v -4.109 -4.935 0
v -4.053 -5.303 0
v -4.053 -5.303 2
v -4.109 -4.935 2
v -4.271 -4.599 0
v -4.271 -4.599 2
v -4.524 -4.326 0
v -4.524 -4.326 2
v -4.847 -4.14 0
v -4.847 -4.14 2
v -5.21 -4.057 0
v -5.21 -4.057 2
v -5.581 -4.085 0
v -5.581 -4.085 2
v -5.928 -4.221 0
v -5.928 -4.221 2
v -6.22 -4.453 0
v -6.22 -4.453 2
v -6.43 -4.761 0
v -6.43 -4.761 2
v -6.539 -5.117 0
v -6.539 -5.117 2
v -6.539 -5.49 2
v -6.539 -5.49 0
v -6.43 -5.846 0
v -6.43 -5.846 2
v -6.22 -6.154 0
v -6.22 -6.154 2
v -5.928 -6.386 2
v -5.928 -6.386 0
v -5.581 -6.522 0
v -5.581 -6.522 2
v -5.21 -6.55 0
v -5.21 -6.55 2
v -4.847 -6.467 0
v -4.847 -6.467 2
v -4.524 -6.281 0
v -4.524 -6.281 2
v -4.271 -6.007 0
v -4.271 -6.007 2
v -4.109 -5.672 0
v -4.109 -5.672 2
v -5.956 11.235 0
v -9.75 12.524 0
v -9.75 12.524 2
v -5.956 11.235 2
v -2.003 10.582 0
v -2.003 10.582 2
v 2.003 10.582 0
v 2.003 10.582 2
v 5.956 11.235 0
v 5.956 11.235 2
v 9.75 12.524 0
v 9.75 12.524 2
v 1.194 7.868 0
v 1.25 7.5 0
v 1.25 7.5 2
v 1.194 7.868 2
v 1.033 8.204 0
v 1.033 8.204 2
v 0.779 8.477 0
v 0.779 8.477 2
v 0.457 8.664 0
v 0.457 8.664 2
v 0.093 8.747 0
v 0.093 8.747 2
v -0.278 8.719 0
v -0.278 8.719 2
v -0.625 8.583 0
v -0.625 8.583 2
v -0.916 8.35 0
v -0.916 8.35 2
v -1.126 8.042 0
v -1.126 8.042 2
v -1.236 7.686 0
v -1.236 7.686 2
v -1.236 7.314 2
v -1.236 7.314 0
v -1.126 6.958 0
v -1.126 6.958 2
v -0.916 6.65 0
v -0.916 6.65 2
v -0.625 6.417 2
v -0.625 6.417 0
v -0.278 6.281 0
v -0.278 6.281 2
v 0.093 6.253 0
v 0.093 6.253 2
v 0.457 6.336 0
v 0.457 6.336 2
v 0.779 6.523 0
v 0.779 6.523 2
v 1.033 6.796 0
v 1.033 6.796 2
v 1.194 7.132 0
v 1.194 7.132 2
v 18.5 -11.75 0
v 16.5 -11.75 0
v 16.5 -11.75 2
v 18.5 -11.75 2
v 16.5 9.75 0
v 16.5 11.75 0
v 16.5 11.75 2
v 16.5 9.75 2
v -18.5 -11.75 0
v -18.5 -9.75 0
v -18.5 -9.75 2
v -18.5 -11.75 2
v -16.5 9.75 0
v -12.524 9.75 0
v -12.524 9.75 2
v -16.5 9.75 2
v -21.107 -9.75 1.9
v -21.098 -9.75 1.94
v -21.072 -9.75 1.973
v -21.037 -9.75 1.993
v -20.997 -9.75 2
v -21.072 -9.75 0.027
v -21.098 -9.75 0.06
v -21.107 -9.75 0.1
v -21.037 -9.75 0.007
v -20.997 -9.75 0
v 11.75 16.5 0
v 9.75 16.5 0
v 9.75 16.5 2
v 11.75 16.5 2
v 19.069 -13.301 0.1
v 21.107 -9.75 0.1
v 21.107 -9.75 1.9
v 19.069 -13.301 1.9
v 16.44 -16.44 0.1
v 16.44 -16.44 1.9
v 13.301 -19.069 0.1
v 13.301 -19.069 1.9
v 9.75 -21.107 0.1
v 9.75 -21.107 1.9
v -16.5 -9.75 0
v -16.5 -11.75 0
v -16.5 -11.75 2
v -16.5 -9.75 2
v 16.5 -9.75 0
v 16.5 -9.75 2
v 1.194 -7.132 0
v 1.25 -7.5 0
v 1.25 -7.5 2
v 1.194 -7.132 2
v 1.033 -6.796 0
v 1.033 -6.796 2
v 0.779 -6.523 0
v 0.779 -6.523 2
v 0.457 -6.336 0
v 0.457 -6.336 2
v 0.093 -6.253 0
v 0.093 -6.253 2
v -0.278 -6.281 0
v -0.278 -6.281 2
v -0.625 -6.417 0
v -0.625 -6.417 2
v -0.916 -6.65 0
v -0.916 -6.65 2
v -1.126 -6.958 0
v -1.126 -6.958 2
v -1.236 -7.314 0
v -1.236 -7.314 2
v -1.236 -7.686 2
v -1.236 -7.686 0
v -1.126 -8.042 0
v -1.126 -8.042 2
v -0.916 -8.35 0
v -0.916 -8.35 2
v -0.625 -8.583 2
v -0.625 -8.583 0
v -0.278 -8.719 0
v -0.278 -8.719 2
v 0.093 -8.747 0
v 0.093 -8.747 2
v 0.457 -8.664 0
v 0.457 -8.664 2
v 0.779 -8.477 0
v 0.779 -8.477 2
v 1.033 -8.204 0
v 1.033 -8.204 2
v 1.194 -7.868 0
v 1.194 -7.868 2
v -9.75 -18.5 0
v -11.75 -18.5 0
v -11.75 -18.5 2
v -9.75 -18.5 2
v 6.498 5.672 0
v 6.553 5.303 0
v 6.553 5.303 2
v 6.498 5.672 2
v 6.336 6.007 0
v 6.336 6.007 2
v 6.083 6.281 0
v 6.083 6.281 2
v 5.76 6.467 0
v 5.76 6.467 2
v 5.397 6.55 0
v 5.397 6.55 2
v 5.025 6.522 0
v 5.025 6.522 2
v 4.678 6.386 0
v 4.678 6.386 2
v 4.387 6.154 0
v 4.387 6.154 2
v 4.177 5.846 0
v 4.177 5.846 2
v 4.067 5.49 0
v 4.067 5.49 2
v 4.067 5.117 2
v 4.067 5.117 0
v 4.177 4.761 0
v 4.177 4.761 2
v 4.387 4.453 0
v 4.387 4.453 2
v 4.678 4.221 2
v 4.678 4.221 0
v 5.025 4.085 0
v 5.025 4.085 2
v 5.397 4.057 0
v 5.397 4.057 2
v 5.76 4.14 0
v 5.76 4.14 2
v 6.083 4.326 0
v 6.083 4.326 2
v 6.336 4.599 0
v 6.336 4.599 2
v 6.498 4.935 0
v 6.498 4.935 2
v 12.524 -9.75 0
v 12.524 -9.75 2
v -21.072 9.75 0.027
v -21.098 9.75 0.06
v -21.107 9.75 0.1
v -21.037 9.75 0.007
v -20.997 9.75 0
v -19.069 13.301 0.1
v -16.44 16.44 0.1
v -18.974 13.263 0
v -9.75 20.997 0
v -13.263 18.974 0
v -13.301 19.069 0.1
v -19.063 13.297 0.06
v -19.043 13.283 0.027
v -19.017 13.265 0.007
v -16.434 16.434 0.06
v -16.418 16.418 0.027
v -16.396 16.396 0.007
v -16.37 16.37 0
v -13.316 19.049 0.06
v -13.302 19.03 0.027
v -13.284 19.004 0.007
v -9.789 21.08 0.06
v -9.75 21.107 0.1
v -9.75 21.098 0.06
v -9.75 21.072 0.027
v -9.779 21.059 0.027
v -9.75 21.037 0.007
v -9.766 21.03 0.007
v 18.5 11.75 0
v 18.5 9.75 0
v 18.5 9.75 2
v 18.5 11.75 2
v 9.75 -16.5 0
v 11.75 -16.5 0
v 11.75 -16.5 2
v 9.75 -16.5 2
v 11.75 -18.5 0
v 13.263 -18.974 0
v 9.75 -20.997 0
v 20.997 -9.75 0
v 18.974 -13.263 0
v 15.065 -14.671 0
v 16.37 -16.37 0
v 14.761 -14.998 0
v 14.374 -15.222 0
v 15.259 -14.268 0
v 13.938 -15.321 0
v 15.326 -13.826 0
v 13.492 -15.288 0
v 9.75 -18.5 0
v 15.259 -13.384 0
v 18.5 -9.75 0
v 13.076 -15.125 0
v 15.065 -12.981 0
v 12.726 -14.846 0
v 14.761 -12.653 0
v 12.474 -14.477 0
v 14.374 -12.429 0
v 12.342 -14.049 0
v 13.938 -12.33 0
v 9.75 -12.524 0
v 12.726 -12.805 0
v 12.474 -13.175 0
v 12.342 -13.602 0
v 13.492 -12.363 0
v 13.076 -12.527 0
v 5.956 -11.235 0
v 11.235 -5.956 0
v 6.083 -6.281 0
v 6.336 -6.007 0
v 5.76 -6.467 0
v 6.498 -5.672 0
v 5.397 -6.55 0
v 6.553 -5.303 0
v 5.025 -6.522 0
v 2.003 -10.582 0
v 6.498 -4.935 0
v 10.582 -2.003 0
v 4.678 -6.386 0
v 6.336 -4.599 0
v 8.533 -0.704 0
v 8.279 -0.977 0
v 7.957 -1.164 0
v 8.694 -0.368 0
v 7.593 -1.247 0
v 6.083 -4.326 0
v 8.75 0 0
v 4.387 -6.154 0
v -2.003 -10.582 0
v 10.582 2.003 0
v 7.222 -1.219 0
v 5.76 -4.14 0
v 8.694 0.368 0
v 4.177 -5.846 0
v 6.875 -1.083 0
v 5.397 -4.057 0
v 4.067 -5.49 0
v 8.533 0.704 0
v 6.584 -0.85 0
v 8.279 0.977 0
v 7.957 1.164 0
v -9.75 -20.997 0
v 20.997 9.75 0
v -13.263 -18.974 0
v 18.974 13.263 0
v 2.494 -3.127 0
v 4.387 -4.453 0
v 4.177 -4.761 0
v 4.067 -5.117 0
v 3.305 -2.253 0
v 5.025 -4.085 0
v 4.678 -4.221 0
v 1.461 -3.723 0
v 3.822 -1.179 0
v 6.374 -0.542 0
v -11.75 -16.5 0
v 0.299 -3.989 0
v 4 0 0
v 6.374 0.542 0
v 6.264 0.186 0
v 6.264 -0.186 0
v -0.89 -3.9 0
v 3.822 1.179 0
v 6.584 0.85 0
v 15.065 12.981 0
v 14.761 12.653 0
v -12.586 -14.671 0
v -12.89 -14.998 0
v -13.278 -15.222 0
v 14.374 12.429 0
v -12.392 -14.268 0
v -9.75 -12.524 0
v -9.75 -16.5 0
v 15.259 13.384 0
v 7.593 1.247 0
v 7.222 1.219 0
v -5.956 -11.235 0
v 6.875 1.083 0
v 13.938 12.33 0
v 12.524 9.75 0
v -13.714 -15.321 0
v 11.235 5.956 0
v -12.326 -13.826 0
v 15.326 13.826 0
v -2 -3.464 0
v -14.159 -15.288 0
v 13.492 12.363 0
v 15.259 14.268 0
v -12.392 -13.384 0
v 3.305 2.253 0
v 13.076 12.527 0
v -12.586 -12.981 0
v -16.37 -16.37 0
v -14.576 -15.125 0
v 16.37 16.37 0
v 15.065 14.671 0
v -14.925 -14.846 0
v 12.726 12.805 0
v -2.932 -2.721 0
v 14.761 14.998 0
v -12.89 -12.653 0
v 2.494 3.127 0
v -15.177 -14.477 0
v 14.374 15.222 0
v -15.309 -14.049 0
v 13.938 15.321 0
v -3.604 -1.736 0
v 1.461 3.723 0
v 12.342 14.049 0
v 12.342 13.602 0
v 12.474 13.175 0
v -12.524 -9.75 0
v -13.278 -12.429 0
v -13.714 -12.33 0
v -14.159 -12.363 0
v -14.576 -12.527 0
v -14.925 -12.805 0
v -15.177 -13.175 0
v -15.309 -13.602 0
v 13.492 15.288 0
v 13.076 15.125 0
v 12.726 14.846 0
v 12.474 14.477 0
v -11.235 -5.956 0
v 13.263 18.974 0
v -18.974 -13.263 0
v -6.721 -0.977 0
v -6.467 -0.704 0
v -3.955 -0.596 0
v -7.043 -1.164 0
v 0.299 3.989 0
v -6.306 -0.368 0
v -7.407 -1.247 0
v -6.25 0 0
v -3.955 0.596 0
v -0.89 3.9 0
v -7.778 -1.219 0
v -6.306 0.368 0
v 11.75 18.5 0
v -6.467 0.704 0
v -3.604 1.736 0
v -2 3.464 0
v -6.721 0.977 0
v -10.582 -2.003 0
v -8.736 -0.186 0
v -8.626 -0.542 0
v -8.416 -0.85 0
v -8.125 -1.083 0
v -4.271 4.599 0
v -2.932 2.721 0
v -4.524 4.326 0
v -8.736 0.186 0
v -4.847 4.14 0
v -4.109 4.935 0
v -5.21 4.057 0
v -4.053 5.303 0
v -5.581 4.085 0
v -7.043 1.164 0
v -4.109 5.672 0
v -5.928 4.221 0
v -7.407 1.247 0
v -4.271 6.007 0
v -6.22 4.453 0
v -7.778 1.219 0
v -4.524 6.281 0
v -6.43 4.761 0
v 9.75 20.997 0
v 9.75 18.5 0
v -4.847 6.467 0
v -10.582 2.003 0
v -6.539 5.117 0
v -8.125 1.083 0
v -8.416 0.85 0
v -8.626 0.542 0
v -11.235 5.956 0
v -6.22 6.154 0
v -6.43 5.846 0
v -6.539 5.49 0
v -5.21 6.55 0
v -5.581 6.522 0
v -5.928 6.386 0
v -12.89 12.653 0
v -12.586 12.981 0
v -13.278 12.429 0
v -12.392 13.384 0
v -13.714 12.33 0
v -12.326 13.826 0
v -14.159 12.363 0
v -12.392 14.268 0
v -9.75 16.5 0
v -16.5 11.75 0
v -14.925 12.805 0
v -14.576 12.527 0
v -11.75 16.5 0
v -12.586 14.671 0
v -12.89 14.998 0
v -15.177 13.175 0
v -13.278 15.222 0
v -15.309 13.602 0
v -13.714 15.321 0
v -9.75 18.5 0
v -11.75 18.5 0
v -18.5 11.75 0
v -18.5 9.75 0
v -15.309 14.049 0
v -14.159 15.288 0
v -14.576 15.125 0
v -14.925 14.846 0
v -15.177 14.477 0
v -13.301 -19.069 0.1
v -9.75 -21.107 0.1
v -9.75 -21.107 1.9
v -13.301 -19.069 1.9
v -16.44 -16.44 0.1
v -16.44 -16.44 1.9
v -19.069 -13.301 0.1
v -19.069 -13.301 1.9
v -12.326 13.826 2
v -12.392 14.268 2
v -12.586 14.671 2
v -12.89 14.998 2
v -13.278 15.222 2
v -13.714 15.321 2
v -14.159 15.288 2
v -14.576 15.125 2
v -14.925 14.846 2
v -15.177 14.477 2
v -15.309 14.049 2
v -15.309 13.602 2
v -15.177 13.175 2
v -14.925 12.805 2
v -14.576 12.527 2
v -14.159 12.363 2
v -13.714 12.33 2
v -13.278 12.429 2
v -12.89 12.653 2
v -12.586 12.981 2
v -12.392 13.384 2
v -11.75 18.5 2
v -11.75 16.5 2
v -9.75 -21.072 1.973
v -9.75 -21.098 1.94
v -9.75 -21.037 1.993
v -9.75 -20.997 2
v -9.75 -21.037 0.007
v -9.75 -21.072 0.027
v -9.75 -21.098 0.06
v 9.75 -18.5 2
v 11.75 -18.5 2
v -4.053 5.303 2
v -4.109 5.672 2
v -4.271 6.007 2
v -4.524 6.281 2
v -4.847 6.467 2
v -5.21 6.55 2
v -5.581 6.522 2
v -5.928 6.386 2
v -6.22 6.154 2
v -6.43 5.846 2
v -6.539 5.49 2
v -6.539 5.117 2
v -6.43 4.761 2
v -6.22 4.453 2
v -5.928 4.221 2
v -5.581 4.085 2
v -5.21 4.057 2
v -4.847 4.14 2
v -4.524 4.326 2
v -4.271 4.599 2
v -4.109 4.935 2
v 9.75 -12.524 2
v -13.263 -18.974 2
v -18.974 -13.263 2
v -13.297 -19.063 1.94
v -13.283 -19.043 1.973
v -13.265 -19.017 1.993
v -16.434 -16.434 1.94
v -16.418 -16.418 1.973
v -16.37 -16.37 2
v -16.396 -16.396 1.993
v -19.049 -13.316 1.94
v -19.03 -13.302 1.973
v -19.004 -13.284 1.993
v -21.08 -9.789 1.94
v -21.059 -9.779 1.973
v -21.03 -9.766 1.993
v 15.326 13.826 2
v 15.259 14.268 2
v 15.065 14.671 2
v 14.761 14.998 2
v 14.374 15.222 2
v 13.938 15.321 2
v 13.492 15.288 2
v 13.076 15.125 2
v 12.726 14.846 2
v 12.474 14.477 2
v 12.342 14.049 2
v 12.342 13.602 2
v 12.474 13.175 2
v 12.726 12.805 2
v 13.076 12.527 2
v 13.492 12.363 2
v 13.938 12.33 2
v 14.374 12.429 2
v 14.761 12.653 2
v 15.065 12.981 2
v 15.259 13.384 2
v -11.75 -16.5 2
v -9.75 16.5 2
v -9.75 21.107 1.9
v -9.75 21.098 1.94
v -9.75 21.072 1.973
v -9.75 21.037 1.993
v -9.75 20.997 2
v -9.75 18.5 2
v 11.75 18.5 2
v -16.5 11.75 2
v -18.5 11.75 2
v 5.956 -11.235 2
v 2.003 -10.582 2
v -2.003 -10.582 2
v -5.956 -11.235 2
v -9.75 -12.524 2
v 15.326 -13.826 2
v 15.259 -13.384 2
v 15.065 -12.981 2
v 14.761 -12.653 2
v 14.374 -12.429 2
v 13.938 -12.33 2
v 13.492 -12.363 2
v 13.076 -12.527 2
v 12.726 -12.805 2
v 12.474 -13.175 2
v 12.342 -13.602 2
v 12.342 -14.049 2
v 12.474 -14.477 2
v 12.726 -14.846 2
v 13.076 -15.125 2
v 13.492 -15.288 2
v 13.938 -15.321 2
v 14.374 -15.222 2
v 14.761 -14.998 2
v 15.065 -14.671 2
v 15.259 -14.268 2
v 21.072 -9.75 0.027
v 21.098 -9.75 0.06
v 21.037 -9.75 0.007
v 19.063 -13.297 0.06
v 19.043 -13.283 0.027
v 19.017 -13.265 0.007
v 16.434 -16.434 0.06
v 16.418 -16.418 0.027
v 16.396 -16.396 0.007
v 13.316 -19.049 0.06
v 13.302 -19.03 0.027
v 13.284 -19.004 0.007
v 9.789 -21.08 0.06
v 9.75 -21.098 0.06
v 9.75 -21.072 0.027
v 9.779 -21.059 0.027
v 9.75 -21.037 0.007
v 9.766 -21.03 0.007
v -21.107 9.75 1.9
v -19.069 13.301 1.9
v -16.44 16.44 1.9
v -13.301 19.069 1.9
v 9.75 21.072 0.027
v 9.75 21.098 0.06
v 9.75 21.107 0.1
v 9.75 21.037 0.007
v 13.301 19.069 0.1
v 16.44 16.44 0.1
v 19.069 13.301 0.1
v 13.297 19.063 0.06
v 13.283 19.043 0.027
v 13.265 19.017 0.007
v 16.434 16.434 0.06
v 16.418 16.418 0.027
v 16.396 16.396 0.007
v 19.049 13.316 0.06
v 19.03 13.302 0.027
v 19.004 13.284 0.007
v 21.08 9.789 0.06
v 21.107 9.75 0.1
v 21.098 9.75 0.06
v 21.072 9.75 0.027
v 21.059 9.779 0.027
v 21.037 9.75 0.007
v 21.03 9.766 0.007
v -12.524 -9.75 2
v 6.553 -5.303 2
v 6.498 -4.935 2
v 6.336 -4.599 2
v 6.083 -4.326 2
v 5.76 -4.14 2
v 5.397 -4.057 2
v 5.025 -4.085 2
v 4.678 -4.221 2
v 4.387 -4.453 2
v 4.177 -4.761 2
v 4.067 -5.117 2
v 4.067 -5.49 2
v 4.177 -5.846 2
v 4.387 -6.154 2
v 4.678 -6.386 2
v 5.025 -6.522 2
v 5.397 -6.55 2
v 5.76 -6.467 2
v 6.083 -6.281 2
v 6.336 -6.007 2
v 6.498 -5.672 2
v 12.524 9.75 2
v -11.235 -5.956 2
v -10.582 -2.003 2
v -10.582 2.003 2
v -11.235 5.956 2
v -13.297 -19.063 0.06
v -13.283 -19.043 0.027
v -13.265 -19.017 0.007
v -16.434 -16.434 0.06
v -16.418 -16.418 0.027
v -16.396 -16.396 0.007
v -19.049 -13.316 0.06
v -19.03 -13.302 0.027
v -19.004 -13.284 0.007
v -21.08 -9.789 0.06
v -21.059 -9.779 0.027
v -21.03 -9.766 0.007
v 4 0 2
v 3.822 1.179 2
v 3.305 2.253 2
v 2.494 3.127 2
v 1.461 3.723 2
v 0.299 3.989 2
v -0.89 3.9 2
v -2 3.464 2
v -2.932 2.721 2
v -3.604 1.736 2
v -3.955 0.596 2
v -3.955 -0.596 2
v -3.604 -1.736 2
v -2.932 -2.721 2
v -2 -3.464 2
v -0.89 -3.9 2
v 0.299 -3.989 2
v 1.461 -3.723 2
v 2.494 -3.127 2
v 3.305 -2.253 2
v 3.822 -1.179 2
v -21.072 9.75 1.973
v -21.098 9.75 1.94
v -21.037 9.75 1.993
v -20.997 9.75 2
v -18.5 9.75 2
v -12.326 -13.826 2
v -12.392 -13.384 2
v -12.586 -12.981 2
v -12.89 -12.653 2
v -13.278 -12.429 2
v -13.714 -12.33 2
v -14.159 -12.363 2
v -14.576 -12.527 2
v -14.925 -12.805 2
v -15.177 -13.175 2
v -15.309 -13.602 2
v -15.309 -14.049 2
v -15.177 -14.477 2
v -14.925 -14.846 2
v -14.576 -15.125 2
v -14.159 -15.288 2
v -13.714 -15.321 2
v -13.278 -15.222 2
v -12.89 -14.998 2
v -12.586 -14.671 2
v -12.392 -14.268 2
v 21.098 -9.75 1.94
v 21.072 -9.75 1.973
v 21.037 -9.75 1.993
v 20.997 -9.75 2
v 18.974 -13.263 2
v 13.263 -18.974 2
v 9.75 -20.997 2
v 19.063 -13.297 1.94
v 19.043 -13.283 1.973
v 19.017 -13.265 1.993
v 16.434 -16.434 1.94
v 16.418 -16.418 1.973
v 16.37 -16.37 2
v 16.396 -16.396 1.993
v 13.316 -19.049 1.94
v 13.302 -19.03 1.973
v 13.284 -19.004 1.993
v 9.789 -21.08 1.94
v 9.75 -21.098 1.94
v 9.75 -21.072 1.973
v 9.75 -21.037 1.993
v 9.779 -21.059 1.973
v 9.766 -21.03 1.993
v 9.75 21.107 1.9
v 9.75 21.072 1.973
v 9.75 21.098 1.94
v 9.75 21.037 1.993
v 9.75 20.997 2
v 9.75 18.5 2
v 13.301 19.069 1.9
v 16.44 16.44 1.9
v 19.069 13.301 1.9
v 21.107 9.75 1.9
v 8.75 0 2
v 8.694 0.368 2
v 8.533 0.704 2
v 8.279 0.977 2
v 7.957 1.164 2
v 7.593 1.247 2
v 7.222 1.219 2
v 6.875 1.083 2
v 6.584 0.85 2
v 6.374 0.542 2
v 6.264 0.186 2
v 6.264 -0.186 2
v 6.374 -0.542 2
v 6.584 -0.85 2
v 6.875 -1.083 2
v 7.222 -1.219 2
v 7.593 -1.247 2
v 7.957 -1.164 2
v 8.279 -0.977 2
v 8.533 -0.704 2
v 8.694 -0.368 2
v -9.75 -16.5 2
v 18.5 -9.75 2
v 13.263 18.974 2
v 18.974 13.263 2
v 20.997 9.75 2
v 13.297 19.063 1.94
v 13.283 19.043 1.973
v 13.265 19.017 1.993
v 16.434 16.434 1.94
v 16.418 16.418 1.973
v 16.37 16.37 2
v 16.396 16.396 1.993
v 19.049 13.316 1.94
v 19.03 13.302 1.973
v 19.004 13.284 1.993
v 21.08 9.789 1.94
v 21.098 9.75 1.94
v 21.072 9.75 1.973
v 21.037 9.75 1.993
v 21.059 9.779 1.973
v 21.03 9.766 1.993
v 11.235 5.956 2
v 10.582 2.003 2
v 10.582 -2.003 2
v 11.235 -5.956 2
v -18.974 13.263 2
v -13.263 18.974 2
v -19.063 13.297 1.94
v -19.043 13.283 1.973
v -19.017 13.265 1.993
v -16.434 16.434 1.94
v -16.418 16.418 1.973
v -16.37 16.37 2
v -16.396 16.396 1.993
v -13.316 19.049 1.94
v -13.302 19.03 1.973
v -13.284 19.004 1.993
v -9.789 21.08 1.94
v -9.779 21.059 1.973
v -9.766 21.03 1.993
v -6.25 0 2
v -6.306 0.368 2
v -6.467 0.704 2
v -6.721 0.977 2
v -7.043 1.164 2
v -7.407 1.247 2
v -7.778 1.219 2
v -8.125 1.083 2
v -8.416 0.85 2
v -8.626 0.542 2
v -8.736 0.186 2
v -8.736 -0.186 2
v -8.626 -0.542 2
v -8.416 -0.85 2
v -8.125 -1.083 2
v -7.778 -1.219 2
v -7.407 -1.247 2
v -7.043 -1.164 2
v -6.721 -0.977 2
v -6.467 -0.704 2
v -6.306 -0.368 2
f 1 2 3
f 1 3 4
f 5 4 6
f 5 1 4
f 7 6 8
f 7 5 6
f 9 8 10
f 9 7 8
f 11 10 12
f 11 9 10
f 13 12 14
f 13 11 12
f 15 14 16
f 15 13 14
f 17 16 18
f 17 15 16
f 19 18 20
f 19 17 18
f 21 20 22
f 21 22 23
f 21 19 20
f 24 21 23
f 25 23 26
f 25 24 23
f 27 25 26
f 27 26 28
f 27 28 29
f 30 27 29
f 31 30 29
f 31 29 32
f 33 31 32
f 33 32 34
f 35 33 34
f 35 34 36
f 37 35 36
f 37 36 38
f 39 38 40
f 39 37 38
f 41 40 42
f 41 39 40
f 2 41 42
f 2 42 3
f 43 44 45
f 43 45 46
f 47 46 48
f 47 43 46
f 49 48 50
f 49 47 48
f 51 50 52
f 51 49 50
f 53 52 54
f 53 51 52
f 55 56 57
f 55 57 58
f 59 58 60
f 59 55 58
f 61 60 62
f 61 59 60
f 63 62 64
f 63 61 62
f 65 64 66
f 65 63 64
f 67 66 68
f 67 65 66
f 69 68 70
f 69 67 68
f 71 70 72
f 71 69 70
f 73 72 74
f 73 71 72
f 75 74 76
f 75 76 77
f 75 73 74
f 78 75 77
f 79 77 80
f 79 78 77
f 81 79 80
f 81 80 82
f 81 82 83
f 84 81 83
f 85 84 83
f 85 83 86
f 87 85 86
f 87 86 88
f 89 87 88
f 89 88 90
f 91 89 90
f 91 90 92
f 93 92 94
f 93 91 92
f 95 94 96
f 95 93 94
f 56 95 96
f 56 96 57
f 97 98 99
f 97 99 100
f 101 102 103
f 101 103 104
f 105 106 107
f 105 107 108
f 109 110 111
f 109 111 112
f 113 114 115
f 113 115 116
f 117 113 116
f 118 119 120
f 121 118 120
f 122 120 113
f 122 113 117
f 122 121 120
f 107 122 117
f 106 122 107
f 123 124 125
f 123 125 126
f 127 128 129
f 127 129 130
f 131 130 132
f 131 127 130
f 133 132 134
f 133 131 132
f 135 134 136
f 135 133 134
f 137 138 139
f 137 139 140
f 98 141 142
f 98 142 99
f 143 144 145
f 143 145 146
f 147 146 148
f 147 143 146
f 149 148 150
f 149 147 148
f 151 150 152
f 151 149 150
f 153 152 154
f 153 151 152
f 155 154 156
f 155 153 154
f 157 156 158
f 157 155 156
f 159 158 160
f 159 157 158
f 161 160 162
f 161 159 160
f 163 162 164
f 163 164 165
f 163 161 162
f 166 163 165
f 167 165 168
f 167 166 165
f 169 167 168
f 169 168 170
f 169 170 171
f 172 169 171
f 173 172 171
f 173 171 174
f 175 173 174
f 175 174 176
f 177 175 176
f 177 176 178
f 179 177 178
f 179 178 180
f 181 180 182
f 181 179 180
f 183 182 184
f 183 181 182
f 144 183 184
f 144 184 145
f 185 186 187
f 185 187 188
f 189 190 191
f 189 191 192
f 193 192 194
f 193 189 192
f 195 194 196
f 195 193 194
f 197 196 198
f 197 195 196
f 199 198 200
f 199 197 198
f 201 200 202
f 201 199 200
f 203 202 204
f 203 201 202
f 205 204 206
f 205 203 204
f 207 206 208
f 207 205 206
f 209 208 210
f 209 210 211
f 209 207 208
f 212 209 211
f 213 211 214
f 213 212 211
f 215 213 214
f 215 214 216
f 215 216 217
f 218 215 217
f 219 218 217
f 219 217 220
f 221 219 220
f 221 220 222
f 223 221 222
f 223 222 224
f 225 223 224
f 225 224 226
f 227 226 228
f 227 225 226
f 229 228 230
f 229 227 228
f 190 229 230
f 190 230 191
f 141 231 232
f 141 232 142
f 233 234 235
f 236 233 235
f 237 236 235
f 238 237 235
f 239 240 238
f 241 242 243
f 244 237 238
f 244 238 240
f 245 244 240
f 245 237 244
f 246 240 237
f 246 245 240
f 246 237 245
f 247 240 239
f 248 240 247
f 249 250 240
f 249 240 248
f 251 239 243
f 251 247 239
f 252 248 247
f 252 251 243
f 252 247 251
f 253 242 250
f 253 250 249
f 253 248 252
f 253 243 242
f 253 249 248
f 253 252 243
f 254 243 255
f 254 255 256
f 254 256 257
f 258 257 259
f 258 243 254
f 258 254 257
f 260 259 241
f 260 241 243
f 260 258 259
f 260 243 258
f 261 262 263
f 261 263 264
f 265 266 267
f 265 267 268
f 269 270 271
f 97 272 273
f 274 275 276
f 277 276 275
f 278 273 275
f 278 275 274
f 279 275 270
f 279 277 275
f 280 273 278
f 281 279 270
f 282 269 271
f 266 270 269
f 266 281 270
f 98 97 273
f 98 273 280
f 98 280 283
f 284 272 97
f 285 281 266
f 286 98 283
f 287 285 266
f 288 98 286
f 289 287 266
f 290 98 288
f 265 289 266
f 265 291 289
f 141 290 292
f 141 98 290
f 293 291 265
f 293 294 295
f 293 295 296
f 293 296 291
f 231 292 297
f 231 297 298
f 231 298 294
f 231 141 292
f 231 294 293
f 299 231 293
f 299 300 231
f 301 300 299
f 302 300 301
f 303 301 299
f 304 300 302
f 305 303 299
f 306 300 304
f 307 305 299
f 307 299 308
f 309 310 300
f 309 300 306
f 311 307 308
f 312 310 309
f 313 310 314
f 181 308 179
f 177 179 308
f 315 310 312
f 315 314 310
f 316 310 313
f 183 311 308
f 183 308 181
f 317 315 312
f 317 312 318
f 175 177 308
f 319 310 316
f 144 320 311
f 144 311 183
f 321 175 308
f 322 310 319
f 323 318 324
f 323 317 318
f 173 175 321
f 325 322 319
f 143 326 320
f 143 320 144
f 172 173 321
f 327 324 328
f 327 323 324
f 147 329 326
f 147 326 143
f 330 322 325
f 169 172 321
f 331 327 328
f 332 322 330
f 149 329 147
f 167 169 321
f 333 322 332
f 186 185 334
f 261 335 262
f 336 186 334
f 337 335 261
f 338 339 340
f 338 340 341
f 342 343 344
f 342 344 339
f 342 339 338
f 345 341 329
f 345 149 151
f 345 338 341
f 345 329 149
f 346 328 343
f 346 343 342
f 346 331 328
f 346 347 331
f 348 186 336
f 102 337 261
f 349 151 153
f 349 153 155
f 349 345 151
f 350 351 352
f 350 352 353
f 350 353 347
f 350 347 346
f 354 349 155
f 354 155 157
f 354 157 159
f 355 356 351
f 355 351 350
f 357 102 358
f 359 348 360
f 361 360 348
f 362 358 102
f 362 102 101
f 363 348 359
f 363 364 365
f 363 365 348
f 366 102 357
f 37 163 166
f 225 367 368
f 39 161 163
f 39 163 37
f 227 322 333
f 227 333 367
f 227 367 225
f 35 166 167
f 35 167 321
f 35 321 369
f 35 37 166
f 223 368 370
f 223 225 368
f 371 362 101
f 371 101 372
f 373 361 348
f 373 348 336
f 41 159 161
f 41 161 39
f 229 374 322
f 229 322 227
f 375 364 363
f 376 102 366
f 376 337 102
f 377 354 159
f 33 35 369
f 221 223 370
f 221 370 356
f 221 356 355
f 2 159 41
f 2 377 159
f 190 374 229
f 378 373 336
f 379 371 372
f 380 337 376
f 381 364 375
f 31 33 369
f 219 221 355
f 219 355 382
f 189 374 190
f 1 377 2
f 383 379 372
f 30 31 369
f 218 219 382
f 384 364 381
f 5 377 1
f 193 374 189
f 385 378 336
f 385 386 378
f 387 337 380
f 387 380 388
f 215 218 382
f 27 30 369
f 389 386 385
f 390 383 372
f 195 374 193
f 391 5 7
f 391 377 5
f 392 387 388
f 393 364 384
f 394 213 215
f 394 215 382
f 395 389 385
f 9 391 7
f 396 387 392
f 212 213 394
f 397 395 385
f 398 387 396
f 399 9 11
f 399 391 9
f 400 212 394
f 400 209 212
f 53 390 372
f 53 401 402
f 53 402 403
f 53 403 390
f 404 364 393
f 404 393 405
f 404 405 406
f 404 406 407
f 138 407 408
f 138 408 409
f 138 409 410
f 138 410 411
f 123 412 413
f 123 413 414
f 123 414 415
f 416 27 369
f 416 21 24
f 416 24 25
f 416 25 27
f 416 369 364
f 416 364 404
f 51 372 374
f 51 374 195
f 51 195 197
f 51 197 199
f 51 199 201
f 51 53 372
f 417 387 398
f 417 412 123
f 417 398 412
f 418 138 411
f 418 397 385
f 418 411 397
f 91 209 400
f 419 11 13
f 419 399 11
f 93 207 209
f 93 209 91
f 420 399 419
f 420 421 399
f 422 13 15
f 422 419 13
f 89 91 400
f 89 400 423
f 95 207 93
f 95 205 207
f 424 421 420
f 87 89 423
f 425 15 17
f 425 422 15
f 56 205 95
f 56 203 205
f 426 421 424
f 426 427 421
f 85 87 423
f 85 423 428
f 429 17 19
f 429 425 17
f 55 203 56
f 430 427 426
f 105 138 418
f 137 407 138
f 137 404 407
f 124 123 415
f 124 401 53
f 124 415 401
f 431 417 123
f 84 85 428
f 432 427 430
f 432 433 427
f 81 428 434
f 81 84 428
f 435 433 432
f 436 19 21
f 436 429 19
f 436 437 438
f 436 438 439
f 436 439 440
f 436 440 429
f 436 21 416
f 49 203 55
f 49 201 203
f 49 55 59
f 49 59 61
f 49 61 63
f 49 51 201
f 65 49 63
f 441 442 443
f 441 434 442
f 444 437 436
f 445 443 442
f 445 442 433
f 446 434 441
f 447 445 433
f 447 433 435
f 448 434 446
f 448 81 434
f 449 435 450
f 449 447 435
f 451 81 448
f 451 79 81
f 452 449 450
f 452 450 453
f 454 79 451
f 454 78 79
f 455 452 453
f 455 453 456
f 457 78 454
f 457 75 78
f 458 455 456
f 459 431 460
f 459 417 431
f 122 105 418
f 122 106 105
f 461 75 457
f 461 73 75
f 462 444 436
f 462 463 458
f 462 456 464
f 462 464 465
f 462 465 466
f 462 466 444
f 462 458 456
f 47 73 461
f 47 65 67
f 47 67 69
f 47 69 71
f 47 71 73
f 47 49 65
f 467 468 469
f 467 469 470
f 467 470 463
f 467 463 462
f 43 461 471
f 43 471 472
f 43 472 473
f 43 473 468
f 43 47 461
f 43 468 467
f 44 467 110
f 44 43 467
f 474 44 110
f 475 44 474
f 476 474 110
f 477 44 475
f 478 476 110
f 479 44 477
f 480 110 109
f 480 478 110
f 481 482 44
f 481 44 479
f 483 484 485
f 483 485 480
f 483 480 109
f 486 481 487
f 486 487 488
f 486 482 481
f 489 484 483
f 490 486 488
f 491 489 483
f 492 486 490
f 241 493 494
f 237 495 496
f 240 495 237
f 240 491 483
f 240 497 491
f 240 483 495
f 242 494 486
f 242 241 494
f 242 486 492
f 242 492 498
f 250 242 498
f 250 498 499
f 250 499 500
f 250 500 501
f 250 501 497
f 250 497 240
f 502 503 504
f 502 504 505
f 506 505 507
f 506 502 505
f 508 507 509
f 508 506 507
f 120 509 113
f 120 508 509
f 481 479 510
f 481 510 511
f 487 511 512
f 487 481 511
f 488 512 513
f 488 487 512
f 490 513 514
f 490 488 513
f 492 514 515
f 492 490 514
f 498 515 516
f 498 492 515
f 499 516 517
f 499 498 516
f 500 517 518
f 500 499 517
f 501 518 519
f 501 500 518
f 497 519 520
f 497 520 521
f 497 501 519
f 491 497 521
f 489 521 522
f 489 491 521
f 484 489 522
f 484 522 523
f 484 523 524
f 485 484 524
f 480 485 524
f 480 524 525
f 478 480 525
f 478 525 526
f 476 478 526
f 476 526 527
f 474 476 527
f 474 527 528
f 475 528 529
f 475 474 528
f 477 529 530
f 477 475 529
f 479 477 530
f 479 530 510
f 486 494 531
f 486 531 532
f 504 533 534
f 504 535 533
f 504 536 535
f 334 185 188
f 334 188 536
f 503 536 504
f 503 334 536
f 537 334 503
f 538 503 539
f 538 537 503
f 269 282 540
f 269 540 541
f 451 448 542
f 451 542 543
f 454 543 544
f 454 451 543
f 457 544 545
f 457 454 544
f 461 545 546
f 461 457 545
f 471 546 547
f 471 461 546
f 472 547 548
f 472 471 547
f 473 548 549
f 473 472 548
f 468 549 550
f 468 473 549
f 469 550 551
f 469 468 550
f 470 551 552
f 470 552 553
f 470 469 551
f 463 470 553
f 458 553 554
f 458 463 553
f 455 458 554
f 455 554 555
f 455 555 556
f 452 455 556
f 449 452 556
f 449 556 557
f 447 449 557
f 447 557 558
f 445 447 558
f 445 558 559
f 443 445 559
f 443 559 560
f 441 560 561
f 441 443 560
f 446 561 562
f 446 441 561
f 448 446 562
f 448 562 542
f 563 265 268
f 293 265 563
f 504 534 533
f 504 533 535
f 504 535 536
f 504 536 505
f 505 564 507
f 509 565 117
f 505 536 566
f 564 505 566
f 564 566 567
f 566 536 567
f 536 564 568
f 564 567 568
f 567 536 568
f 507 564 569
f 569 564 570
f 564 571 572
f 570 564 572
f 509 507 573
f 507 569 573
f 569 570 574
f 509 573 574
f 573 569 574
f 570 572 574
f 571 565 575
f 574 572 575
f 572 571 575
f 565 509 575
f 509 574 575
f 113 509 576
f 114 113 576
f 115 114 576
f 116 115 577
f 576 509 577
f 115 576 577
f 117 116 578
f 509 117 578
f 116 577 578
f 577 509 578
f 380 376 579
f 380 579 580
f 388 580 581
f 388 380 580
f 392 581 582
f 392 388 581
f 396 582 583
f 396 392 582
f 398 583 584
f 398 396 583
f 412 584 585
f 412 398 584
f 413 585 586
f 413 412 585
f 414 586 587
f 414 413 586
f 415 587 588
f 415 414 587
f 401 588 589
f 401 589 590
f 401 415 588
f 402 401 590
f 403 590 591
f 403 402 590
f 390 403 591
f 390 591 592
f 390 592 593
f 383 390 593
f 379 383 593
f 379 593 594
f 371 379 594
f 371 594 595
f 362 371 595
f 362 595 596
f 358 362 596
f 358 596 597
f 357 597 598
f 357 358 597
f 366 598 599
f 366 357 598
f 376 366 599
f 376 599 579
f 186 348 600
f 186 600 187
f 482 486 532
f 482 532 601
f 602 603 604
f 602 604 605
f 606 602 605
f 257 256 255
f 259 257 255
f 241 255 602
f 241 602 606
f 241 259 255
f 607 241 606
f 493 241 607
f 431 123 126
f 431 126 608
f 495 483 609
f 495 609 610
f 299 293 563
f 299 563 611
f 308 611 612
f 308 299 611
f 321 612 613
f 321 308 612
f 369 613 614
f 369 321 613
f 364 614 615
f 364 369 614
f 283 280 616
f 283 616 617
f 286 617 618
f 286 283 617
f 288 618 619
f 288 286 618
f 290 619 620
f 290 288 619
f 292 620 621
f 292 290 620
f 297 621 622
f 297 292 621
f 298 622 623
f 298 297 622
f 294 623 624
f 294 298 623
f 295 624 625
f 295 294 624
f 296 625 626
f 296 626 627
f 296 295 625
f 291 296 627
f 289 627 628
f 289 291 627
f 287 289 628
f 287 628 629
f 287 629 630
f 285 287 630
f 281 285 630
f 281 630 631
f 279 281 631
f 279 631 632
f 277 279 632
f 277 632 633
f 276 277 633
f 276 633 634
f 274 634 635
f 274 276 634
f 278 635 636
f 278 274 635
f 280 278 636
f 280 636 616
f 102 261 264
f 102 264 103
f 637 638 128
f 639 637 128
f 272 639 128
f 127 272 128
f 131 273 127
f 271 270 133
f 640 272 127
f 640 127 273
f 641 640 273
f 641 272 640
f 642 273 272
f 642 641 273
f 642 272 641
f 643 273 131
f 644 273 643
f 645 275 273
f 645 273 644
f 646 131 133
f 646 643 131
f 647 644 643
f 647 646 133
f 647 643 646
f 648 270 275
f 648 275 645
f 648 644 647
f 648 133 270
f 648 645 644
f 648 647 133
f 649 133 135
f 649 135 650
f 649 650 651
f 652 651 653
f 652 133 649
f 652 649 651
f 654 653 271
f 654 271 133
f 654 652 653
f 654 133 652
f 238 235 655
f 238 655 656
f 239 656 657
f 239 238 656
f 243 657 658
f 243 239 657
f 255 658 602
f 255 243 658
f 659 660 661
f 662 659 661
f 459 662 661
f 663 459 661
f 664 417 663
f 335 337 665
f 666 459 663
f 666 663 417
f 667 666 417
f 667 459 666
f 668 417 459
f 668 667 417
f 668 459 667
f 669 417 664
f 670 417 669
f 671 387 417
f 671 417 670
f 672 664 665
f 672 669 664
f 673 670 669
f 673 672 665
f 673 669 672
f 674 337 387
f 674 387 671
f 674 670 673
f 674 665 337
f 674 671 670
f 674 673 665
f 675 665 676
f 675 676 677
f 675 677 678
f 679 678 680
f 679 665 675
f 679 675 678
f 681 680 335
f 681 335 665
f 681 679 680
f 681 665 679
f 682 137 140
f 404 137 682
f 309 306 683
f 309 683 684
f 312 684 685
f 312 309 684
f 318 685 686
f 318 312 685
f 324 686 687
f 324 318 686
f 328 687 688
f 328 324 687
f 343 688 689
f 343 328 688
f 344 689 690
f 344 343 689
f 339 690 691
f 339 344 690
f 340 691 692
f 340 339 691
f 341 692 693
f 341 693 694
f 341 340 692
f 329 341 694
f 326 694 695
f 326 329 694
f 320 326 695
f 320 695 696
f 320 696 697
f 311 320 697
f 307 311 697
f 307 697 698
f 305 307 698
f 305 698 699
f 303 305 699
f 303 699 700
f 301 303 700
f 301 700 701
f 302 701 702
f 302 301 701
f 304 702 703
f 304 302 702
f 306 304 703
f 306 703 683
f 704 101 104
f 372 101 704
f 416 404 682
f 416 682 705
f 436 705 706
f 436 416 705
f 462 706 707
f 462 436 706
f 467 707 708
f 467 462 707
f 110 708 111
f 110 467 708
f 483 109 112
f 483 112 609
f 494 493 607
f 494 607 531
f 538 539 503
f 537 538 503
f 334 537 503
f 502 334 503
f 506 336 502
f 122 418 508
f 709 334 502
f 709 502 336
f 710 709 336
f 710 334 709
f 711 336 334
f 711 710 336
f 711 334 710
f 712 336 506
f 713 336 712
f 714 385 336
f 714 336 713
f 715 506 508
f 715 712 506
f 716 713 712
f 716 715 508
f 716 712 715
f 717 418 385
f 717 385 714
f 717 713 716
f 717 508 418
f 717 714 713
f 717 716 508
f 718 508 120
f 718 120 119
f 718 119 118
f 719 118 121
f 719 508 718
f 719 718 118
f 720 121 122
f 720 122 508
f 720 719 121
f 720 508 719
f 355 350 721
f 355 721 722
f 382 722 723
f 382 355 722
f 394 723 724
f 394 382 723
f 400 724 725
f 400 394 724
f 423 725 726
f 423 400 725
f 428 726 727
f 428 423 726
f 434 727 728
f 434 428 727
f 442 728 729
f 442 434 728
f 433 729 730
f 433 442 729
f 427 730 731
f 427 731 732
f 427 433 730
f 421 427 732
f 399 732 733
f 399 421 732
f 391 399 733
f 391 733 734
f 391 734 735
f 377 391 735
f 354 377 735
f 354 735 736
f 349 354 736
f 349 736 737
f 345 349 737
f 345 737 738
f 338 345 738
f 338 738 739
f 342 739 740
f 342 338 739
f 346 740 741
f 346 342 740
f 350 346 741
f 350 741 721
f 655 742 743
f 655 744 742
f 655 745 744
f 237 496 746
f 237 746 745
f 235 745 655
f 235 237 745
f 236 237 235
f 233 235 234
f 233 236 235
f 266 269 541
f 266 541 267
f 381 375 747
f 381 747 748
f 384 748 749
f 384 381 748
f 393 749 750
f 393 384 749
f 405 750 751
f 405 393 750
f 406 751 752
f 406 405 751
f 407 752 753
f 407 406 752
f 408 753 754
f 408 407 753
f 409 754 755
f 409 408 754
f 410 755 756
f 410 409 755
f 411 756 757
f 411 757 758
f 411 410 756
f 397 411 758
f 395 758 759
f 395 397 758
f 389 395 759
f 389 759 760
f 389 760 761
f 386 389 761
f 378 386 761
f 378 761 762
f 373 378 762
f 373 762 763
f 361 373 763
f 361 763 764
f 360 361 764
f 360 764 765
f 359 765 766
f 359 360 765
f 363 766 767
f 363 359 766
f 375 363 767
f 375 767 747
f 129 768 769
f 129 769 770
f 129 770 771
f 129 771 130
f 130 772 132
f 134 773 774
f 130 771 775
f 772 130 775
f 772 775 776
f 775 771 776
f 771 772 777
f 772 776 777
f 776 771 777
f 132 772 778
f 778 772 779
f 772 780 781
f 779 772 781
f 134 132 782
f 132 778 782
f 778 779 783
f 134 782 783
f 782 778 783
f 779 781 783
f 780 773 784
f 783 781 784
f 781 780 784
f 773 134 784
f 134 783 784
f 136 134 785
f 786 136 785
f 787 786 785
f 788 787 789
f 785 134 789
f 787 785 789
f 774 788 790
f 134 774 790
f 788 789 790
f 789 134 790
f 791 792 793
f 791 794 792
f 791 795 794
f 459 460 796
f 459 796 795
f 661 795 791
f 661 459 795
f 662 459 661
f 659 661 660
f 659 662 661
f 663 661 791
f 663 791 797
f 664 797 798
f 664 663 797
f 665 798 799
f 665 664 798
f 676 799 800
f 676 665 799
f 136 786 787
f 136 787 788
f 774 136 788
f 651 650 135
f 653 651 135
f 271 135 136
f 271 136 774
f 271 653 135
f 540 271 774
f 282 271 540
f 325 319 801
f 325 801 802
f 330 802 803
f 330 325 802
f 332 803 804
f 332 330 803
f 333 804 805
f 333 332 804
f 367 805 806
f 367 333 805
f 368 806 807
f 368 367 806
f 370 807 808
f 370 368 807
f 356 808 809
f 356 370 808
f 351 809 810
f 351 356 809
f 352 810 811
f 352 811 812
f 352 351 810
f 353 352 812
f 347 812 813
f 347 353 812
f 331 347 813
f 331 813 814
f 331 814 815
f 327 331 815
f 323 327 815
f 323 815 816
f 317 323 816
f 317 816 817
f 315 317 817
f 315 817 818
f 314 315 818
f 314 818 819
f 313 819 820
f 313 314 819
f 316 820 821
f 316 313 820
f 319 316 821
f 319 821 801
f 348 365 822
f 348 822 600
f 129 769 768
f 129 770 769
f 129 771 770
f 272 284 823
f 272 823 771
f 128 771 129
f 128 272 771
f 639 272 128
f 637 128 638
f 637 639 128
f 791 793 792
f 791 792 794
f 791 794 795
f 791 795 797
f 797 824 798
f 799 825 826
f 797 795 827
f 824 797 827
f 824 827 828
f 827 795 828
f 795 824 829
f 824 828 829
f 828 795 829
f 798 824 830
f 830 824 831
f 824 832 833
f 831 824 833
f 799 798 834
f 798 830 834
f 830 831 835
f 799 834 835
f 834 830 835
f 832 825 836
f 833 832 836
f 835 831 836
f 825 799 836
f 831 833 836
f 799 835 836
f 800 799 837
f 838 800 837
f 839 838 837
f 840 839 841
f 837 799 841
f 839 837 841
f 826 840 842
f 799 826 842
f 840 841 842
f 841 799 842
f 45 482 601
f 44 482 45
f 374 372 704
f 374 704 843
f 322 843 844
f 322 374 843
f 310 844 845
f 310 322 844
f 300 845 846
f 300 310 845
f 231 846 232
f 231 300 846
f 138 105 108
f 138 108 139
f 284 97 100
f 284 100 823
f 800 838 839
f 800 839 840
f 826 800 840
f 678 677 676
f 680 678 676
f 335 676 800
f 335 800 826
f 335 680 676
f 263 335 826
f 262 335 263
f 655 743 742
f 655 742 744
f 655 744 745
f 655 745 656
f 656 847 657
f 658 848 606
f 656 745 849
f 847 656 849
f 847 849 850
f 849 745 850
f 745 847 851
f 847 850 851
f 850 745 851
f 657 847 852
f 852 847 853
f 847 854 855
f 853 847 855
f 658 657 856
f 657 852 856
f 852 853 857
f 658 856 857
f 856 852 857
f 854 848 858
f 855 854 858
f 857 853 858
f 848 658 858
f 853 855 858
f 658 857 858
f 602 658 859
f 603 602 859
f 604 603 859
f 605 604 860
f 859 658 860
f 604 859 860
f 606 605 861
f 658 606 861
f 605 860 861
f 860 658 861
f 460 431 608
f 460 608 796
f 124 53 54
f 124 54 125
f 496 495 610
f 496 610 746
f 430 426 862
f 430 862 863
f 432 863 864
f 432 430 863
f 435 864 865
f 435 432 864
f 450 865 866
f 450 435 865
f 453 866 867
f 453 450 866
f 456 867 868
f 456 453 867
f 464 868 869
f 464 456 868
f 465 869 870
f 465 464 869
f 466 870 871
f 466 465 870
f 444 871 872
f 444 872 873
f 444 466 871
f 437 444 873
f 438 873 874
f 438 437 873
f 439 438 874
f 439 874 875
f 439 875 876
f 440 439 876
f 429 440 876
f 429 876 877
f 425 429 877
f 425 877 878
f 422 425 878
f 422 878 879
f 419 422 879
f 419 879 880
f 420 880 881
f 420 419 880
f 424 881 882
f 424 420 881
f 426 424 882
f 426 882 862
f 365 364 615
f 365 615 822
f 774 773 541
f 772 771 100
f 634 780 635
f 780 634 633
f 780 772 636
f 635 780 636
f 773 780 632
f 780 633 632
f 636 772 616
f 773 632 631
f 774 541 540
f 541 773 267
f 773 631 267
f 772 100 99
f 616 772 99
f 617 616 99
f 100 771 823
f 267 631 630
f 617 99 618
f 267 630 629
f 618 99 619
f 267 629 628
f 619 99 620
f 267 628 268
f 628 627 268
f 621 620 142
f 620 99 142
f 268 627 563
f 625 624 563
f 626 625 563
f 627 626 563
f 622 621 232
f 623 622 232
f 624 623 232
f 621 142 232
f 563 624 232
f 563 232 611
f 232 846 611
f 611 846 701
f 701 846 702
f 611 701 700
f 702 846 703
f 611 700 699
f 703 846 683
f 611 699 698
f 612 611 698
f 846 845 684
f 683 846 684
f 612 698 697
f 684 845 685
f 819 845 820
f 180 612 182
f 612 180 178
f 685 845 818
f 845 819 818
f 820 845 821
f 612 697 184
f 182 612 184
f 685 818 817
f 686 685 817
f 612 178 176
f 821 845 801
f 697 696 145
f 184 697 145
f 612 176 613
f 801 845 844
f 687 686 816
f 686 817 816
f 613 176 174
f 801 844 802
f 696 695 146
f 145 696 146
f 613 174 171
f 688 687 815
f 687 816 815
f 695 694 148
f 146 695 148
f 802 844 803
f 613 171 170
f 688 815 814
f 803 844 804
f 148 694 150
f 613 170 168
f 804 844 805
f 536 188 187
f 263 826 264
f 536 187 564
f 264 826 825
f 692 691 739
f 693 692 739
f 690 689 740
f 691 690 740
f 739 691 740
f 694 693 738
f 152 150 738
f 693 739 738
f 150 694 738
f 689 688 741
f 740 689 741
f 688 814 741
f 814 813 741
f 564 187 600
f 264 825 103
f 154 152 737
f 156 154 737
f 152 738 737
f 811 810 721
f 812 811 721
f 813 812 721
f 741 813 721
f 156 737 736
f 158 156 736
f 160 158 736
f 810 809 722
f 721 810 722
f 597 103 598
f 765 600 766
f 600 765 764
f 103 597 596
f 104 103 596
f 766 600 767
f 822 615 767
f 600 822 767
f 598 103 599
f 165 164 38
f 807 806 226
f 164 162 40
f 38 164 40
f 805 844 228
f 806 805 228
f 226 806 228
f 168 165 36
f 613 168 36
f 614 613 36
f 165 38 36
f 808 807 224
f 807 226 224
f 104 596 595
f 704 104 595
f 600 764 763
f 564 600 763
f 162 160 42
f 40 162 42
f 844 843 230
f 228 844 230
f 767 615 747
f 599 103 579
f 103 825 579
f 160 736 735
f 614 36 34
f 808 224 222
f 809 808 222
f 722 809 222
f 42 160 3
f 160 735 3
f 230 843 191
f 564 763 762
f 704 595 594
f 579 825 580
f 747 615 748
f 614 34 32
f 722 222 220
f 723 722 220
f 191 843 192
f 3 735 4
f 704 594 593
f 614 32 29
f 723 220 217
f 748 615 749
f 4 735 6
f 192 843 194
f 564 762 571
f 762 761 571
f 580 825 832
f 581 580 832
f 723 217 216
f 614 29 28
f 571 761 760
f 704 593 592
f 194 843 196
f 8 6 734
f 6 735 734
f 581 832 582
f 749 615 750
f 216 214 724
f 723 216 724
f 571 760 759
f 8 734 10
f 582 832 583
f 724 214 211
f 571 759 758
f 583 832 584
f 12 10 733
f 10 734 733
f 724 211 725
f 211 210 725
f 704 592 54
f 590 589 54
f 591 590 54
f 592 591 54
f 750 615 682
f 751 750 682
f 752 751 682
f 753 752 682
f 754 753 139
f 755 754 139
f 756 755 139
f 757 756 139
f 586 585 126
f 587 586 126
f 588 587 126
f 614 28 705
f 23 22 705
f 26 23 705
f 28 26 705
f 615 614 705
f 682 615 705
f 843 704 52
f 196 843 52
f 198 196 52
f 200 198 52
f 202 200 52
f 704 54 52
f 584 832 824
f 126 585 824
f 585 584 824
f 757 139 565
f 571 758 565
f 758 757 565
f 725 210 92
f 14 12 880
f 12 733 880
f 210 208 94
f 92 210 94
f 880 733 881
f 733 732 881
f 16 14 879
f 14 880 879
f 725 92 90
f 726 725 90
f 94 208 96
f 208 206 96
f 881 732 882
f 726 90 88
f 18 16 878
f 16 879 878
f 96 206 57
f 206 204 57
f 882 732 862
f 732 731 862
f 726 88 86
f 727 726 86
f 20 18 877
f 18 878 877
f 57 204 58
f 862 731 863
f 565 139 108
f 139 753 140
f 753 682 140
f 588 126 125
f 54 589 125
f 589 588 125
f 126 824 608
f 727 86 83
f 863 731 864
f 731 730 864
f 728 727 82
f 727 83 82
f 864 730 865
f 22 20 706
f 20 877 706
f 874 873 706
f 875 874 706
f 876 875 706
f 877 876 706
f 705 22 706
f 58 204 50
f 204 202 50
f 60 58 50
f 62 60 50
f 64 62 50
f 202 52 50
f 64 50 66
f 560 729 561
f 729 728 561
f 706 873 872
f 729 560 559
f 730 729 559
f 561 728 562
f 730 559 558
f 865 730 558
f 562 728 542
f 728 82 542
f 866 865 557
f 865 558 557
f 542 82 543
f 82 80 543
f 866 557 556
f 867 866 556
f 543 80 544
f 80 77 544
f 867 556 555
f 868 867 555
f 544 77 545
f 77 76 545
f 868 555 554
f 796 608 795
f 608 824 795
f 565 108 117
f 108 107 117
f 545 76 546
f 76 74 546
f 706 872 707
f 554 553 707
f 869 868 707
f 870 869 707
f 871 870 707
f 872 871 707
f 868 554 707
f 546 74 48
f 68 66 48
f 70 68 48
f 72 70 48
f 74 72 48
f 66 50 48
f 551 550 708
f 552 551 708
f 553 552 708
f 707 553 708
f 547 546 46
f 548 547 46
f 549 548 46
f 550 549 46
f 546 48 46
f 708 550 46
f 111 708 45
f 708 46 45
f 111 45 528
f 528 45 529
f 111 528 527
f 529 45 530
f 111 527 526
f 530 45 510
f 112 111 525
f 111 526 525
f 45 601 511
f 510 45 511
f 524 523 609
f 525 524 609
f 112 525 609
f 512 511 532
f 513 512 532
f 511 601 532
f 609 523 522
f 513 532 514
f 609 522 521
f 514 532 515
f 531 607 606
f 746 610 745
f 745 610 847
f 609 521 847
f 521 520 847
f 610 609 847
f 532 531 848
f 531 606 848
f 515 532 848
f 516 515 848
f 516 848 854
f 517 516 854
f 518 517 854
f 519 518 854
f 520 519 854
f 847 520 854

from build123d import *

# Parameters (mm, degrees)
SKETCH_2_R      = 4
SKETCH_2_R_2    = 1.25
SKETCH_2_R_3    = 1.5
EXTRUDE_1_DEPTH = 2
FILLET_1_R      = 0.1


with BuildPart() as part:
    # Эскиз2 → Бобышка-Вытянуть1 (new body)
    with BuildSketch(Plane.XY):
        with BuildLine():
            Line((-9.75, 16.5), (-9.75, 12.523623513))
            ThreePointArc((-9.75, 12.523623513), (0, 10.5), (9.75, 12.523623513))
            Line((9.75, 12.523623513), (9.75, 16.5))
            Line((9.75, 16.5), (11.75, 16.5))
            Line((11.75, 16.5), (11.75, 18.5))
            Line((11.75, 18.5), (9.75, 18.5))
            Line((9.75, 18.5), (9.75, 21.106870919))
            ThreePointArc((9.75, 21.106870919), (16.440232663, 16.440232663), (21.106870919, 9.75))
            Line((21.106870919, 9.75), (18.5, 9.75))
            Line((18.5, 9.75), (18.5, 11.75))
            Line((18.5, 11.75), (16.5, 11.75))
            Line((16.5, 11.75), (16.5, 9.75))
            Line((16.5, 9.75), (12.523623513, 9.75))
            ThreePointArc((12.523623513, 9.75), (10.5, 0), (12.523623513, -9.75))
            Line((12.523623513, -9.75), (16.5, -9.75))
            Line((16.5, -9.75), (16.5, -11.75))
            Line((16.5, -11.75), (18.5, -11.75))
            Line((18.5, -11.75), (18.5, -9.75))
            Line((18.5, -9.75), (21.106870919, -9.75))
            ThreePointArc((21.106870919, -9.75), (16.440232663, -16.440232663), (9.75, -21.106870919))
            Line((9.75, -21.106870919), (9.75, -18.5))
            Line((9.75, -18.5), (11.75, -18.5))
            Line((11.75, -18.5), (11.75, -16.5))
            Line((11.75, -16.5), (9.75, -16.5))
            Line((9.75, -16.5), (9.75, -12.523623513))
            ThreePointArc((9.75, -12.523623513), (0, -10.5), (-9.75, -12.523623513))
            Line((-9.75, -12.523623513), (-9.75, -16.5))
            Line((-9.75, -16.5), (-11.75, -16.5))
            Line((-11.75, -16.5), (-11.75, -18.5))
            Line((-11.75, -18.5), (-9.75, -18.5))
            Line((-9.75, -18.5), (-9.75, -21.106870919))
            ThreePointArc((-9.75, -21.106870919), (-16.440232663, -16.440232663), (-21.106870919, -9.75))
            Line((-21.106870919, -9.75), (-18.5, -9.75))
            Line((-18.5, -9.75), (-18.5, -11.75))
            Line((-18.5, -11.75), (-16.5, -11.75))
            Line((-16.5, -11.75), (-16.5, -9.75))
            Line((-16.5, -9.75), (-12.523623513, -9.75))
            ThreePointArc((-12.523623513, -9.75), (-10.5, 0), (-12.523623513, 9.75))
            Line((-12.523623513, 9.75), (-16.5, 9.75))
            Line((-16.5, 9.75), (-16.5, 11.75))
            Line((-16.5, 11.75), (-18.5, 11.75))
            Line((-18.5, 11.75), (-18.5, 9.75))
            Line((-18.5, 9.75), (-21.106870919, 9.75))
            ThreePointArc((-21.106870919, 9.75), (-16.440232663, 16.440232663), (-9.75, 21.106870919))
            Line((-9.75, 21.106870919), (-9.75, 18.5))
            Line((-9.75, 18.5), (-11.75, 18.5))
            Line((-11.75, 18.5), (-11.75, 16.5))
            Line((-11.75, 16.5), (-9.75, 16.5))
        make_face()
        Circle(SKETCH_2_R, mode=Mode.SUBTRACT)
        with Locations((0, 7.5)):
            Circle(SKETCH_2_R_2, mode=Mode.SUBTRACT)
        with Locations((5.303300859, 5.303300859)):
            Circle(SKETCH_2_R_2, mode=Mode.SUBTRACT)
        with Locations((7.5, 0)):
            Circle(SKETCH_2_R_2, mode=Mode.SUBTRACT)
        with Locations((5.303300859, -5.303300859)):
            Circle(SKETCH_2_R_2, mode=Mode.SUBTRACT)
        with Locations((0, -7.5)):
            Circle(SKETCH_2_R_2, mode=Mode.SUBTRACT)
        with Locations((-5.303300859, -5.303300859)):
            Circle(SKETCH_2_R_2, mode=Mode.SUBTRACT)
        with Locations((-7.5, 0)):
            Circle(SKETCH_2_R_2, mode=Mode.SUBTRACT)
        with Locations((-5.303300859, 5.303300859)):
            Circle(SKETCH_2_R_2, mode=Mode.SUBTRACT)
        with Locations((13.825687912, 13.825687912)):
            Circle(SKETCH_2_R_3, mode=Mode.SUBTRACT)
        with Locations((13.825687912, -13.825687912)):
            Circle(SKETCH_2_R_3, mode=Mode.SUBTRACT)
        with Locations((-13.825687912, -13.825687912)):
            Circle(SKETCH_2_R_3, mode=Mode.SUBTRACT)
        with Locations((-13.825687912, 13.825687912)):
            Circle(SKETCH_2_R_3, mode=Mode.SUBTRACT)
    extrude(amount=EXTRUDE_1_DEPTH)

    # Скругление1
    fillet_1_edges = [part.edges().sort_by_distance(p)[0] for p in [
        (16.440232663, -16.440232663, 2),
        (16.440232663, 16.440232663, 2),
        (16.440232663, -16.440232663, 0),
        (-16.440232663, -16.440232663, 0),
        (-16.440232663, 16.440232663, 0),
        (16.440232663, 16.440232663, 0),
        (-16.440232663, 16.440232663, 2),
        (-16.440232663, -16.440232663, 2),
    ]]
    fillet(fillet_1_edges, radius=FILLET_1_R)


solid = part.part
